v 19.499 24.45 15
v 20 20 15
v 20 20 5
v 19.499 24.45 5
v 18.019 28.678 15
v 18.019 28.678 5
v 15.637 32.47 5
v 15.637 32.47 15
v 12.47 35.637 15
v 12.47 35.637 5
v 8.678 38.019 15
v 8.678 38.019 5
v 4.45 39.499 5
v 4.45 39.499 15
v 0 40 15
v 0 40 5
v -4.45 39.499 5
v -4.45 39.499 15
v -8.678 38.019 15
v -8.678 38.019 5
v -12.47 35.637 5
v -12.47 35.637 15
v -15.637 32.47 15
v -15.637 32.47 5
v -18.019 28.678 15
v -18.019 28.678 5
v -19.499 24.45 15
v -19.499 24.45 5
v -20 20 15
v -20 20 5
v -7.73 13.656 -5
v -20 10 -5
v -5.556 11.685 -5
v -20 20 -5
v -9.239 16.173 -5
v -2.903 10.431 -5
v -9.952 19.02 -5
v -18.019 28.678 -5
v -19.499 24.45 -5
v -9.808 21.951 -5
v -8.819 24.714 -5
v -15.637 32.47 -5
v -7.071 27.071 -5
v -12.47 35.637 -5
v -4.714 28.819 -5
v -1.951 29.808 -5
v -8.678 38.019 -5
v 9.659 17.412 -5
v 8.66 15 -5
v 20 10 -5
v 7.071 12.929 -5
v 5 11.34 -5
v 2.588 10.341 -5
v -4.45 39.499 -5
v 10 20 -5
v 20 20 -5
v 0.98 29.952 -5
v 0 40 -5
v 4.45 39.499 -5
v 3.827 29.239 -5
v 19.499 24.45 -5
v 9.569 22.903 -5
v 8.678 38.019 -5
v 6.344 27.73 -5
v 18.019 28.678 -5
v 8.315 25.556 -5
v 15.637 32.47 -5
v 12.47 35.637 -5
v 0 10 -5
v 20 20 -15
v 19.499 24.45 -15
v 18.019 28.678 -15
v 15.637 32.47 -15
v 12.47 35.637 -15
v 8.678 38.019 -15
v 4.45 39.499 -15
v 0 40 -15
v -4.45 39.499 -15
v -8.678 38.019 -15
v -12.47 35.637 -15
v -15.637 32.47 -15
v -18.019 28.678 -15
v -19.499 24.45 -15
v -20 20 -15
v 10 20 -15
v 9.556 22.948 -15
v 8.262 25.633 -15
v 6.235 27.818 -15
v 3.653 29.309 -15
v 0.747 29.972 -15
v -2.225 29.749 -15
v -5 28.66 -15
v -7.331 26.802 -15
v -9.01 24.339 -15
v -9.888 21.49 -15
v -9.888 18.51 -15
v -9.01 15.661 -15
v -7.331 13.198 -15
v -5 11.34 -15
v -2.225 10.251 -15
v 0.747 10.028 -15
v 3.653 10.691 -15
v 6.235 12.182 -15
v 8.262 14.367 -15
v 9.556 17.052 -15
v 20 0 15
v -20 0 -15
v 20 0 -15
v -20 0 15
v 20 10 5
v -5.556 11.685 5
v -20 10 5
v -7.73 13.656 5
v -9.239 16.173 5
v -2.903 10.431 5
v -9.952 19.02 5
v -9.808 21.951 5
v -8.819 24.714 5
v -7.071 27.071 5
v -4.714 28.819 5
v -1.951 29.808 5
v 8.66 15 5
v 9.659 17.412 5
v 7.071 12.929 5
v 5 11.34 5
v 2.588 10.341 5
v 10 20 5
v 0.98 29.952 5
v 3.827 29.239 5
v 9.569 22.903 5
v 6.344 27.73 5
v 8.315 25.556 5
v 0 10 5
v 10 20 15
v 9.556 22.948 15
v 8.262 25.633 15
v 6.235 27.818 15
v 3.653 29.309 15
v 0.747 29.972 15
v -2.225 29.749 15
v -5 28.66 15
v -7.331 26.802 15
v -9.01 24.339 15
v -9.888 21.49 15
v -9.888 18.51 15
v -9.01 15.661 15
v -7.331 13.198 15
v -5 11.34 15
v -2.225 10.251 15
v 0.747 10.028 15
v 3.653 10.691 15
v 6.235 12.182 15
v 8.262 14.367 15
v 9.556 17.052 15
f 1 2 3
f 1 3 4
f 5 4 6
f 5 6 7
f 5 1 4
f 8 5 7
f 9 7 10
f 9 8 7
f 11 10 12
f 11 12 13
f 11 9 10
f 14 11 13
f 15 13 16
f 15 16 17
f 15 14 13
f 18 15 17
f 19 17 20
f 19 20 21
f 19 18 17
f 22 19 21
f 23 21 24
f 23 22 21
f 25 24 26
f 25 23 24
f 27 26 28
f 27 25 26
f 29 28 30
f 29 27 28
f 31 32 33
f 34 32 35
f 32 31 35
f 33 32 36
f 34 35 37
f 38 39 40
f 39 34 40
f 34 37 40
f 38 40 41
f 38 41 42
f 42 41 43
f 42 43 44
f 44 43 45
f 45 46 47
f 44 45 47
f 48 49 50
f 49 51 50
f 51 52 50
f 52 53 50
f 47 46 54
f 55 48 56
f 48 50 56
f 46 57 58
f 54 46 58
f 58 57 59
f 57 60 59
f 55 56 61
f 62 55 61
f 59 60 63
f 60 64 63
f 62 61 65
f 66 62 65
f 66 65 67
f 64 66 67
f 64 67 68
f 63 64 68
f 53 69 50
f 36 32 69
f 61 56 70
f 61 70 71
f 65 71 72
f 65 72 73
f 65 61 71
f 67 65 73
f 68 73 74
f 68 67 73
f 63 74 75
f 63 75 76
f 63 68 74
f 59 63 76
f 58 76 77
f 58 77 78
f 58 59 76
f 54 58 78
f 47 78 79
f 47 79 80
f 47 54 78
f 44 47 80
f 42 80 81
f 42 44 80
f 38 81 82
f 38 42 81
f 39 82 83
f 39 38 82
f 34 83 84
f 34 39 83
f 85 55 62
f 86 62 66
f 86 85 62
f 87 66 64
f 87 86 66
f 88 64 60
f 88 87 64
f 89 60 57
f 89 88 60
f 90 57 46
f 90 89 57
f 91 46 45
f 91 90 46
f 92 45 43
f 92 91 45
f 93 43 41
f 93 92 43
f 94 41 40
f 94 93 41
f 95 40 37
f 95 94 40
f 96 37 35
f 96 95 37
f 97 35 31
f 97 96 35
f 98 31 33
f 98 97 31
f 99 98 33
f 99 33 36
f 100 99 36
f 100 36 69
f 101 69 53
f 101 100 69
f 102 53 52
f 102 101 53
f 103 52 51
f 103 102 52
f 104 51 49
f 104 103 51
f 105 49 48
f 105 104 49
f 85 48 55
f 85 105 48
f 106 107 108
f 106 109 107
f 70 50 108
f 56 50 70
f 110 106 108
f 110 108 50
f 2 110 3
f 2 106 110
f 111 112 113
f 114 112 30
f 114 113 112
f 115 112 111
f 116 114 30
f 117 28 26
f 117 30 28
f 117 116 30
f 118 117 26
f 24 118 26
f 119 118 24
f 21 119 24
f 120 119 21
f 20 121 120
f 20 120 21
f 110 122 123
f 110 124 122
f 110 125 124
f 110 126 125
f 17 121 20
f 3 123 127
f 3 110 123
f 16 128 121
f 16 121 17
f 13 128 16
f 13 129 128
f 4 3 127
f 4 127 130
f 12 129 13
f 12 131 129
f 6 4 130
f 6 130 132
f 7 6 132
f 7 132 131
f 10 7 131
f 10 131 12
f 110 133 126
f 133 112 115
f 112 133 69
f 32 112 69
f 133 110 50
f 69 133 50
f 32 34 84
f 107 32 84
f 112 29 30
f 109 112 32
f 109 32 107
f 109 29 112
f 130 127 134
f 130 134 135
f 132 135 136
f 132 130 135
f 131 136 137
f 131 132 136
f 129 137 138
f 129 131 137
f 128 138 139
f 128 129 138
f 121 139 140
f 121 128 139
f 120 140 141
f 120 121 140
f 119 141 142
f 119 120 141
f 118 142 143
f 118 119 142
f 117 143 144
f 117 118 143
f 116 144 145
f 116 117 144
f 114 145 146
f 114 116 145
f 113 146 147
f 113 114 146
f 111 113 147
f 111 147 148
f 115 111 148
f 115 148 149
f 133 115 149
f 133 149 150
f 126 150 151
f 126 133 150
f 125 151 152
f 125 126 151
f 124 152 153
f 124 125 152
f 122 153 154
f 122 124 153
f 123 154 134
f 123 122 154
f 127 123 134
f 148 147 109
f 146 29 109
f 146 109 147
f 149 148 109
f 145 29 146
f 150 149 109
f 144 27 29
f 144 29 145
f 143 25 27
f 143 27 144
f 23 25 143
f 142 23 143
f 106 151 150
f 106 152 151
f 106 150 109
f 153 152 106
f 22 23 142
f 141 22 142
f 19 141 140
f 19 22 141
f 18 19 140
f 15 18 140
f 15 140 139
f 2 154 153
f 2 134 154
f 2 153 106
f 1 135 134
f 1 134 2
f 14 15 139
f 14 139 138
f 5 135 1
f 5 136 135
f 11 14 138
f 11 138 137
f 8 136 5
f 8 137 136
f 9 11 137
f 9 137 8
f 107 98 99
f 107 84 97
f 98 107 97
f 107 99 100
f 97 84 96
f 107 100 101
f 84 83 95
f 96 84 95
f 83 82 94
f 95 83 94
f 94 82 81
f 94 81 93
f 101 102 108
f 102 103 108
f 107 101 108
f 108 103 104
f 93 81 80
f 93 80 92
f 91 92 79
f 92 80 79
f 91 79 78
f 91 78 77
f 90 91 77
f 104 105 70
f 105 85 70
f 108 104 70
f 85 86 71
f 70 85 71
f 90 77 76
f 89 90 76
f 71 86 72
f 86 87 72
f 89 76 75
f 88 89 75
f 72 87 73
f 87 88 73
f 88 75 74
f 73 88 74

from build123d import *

# Parameters (mm, degrees)
ESBO_O1_R                = 10
RESSALTO_EXTRUS_O1_DEPTH = 15
ESBO_O2_W                = 10
ESBO_O2_H                = 36.681278326
CORTE_EXTRUS_O1_DEPTH    = 41


with BuildPart() as part:
    # Esboço1 → Ressalto-extrusão1 (new body, symmetric)
    with BuildSketch(Plane.XY):
        with BuildLine():
            Line((-20, 0), (20, 0))
            Line((20, 0), (20, 20))
            ThreePointArc((20, 20), (0, 40), (-20, 20))
            Line((-20, 20), (-20, 0))
        make_face()
        with Locations((0, 20)):
            Circle(ESBO_O1_R, mode=Mode.SUBTRACT)
    extrude(amount=RESSALTO_EXTRUS_O1_DEPTH, both=True)

    # Esboço2 → Corte-extrusão1 (cut, through all)
    with BuildSketch(Plane(origin=(20, 0, 0), x_dir=(0, 0, -1), z_dir=(1, 0, 0))):
        with Locations((0, 28.340639163)):
            Rectangle(ESBO_O2_W, ESBO_O2_H)
    extrude(amount=-CORTE_EXTRUS_O1_DEPTH, mode=Mode.SUBTRACT)


solid = part.part
